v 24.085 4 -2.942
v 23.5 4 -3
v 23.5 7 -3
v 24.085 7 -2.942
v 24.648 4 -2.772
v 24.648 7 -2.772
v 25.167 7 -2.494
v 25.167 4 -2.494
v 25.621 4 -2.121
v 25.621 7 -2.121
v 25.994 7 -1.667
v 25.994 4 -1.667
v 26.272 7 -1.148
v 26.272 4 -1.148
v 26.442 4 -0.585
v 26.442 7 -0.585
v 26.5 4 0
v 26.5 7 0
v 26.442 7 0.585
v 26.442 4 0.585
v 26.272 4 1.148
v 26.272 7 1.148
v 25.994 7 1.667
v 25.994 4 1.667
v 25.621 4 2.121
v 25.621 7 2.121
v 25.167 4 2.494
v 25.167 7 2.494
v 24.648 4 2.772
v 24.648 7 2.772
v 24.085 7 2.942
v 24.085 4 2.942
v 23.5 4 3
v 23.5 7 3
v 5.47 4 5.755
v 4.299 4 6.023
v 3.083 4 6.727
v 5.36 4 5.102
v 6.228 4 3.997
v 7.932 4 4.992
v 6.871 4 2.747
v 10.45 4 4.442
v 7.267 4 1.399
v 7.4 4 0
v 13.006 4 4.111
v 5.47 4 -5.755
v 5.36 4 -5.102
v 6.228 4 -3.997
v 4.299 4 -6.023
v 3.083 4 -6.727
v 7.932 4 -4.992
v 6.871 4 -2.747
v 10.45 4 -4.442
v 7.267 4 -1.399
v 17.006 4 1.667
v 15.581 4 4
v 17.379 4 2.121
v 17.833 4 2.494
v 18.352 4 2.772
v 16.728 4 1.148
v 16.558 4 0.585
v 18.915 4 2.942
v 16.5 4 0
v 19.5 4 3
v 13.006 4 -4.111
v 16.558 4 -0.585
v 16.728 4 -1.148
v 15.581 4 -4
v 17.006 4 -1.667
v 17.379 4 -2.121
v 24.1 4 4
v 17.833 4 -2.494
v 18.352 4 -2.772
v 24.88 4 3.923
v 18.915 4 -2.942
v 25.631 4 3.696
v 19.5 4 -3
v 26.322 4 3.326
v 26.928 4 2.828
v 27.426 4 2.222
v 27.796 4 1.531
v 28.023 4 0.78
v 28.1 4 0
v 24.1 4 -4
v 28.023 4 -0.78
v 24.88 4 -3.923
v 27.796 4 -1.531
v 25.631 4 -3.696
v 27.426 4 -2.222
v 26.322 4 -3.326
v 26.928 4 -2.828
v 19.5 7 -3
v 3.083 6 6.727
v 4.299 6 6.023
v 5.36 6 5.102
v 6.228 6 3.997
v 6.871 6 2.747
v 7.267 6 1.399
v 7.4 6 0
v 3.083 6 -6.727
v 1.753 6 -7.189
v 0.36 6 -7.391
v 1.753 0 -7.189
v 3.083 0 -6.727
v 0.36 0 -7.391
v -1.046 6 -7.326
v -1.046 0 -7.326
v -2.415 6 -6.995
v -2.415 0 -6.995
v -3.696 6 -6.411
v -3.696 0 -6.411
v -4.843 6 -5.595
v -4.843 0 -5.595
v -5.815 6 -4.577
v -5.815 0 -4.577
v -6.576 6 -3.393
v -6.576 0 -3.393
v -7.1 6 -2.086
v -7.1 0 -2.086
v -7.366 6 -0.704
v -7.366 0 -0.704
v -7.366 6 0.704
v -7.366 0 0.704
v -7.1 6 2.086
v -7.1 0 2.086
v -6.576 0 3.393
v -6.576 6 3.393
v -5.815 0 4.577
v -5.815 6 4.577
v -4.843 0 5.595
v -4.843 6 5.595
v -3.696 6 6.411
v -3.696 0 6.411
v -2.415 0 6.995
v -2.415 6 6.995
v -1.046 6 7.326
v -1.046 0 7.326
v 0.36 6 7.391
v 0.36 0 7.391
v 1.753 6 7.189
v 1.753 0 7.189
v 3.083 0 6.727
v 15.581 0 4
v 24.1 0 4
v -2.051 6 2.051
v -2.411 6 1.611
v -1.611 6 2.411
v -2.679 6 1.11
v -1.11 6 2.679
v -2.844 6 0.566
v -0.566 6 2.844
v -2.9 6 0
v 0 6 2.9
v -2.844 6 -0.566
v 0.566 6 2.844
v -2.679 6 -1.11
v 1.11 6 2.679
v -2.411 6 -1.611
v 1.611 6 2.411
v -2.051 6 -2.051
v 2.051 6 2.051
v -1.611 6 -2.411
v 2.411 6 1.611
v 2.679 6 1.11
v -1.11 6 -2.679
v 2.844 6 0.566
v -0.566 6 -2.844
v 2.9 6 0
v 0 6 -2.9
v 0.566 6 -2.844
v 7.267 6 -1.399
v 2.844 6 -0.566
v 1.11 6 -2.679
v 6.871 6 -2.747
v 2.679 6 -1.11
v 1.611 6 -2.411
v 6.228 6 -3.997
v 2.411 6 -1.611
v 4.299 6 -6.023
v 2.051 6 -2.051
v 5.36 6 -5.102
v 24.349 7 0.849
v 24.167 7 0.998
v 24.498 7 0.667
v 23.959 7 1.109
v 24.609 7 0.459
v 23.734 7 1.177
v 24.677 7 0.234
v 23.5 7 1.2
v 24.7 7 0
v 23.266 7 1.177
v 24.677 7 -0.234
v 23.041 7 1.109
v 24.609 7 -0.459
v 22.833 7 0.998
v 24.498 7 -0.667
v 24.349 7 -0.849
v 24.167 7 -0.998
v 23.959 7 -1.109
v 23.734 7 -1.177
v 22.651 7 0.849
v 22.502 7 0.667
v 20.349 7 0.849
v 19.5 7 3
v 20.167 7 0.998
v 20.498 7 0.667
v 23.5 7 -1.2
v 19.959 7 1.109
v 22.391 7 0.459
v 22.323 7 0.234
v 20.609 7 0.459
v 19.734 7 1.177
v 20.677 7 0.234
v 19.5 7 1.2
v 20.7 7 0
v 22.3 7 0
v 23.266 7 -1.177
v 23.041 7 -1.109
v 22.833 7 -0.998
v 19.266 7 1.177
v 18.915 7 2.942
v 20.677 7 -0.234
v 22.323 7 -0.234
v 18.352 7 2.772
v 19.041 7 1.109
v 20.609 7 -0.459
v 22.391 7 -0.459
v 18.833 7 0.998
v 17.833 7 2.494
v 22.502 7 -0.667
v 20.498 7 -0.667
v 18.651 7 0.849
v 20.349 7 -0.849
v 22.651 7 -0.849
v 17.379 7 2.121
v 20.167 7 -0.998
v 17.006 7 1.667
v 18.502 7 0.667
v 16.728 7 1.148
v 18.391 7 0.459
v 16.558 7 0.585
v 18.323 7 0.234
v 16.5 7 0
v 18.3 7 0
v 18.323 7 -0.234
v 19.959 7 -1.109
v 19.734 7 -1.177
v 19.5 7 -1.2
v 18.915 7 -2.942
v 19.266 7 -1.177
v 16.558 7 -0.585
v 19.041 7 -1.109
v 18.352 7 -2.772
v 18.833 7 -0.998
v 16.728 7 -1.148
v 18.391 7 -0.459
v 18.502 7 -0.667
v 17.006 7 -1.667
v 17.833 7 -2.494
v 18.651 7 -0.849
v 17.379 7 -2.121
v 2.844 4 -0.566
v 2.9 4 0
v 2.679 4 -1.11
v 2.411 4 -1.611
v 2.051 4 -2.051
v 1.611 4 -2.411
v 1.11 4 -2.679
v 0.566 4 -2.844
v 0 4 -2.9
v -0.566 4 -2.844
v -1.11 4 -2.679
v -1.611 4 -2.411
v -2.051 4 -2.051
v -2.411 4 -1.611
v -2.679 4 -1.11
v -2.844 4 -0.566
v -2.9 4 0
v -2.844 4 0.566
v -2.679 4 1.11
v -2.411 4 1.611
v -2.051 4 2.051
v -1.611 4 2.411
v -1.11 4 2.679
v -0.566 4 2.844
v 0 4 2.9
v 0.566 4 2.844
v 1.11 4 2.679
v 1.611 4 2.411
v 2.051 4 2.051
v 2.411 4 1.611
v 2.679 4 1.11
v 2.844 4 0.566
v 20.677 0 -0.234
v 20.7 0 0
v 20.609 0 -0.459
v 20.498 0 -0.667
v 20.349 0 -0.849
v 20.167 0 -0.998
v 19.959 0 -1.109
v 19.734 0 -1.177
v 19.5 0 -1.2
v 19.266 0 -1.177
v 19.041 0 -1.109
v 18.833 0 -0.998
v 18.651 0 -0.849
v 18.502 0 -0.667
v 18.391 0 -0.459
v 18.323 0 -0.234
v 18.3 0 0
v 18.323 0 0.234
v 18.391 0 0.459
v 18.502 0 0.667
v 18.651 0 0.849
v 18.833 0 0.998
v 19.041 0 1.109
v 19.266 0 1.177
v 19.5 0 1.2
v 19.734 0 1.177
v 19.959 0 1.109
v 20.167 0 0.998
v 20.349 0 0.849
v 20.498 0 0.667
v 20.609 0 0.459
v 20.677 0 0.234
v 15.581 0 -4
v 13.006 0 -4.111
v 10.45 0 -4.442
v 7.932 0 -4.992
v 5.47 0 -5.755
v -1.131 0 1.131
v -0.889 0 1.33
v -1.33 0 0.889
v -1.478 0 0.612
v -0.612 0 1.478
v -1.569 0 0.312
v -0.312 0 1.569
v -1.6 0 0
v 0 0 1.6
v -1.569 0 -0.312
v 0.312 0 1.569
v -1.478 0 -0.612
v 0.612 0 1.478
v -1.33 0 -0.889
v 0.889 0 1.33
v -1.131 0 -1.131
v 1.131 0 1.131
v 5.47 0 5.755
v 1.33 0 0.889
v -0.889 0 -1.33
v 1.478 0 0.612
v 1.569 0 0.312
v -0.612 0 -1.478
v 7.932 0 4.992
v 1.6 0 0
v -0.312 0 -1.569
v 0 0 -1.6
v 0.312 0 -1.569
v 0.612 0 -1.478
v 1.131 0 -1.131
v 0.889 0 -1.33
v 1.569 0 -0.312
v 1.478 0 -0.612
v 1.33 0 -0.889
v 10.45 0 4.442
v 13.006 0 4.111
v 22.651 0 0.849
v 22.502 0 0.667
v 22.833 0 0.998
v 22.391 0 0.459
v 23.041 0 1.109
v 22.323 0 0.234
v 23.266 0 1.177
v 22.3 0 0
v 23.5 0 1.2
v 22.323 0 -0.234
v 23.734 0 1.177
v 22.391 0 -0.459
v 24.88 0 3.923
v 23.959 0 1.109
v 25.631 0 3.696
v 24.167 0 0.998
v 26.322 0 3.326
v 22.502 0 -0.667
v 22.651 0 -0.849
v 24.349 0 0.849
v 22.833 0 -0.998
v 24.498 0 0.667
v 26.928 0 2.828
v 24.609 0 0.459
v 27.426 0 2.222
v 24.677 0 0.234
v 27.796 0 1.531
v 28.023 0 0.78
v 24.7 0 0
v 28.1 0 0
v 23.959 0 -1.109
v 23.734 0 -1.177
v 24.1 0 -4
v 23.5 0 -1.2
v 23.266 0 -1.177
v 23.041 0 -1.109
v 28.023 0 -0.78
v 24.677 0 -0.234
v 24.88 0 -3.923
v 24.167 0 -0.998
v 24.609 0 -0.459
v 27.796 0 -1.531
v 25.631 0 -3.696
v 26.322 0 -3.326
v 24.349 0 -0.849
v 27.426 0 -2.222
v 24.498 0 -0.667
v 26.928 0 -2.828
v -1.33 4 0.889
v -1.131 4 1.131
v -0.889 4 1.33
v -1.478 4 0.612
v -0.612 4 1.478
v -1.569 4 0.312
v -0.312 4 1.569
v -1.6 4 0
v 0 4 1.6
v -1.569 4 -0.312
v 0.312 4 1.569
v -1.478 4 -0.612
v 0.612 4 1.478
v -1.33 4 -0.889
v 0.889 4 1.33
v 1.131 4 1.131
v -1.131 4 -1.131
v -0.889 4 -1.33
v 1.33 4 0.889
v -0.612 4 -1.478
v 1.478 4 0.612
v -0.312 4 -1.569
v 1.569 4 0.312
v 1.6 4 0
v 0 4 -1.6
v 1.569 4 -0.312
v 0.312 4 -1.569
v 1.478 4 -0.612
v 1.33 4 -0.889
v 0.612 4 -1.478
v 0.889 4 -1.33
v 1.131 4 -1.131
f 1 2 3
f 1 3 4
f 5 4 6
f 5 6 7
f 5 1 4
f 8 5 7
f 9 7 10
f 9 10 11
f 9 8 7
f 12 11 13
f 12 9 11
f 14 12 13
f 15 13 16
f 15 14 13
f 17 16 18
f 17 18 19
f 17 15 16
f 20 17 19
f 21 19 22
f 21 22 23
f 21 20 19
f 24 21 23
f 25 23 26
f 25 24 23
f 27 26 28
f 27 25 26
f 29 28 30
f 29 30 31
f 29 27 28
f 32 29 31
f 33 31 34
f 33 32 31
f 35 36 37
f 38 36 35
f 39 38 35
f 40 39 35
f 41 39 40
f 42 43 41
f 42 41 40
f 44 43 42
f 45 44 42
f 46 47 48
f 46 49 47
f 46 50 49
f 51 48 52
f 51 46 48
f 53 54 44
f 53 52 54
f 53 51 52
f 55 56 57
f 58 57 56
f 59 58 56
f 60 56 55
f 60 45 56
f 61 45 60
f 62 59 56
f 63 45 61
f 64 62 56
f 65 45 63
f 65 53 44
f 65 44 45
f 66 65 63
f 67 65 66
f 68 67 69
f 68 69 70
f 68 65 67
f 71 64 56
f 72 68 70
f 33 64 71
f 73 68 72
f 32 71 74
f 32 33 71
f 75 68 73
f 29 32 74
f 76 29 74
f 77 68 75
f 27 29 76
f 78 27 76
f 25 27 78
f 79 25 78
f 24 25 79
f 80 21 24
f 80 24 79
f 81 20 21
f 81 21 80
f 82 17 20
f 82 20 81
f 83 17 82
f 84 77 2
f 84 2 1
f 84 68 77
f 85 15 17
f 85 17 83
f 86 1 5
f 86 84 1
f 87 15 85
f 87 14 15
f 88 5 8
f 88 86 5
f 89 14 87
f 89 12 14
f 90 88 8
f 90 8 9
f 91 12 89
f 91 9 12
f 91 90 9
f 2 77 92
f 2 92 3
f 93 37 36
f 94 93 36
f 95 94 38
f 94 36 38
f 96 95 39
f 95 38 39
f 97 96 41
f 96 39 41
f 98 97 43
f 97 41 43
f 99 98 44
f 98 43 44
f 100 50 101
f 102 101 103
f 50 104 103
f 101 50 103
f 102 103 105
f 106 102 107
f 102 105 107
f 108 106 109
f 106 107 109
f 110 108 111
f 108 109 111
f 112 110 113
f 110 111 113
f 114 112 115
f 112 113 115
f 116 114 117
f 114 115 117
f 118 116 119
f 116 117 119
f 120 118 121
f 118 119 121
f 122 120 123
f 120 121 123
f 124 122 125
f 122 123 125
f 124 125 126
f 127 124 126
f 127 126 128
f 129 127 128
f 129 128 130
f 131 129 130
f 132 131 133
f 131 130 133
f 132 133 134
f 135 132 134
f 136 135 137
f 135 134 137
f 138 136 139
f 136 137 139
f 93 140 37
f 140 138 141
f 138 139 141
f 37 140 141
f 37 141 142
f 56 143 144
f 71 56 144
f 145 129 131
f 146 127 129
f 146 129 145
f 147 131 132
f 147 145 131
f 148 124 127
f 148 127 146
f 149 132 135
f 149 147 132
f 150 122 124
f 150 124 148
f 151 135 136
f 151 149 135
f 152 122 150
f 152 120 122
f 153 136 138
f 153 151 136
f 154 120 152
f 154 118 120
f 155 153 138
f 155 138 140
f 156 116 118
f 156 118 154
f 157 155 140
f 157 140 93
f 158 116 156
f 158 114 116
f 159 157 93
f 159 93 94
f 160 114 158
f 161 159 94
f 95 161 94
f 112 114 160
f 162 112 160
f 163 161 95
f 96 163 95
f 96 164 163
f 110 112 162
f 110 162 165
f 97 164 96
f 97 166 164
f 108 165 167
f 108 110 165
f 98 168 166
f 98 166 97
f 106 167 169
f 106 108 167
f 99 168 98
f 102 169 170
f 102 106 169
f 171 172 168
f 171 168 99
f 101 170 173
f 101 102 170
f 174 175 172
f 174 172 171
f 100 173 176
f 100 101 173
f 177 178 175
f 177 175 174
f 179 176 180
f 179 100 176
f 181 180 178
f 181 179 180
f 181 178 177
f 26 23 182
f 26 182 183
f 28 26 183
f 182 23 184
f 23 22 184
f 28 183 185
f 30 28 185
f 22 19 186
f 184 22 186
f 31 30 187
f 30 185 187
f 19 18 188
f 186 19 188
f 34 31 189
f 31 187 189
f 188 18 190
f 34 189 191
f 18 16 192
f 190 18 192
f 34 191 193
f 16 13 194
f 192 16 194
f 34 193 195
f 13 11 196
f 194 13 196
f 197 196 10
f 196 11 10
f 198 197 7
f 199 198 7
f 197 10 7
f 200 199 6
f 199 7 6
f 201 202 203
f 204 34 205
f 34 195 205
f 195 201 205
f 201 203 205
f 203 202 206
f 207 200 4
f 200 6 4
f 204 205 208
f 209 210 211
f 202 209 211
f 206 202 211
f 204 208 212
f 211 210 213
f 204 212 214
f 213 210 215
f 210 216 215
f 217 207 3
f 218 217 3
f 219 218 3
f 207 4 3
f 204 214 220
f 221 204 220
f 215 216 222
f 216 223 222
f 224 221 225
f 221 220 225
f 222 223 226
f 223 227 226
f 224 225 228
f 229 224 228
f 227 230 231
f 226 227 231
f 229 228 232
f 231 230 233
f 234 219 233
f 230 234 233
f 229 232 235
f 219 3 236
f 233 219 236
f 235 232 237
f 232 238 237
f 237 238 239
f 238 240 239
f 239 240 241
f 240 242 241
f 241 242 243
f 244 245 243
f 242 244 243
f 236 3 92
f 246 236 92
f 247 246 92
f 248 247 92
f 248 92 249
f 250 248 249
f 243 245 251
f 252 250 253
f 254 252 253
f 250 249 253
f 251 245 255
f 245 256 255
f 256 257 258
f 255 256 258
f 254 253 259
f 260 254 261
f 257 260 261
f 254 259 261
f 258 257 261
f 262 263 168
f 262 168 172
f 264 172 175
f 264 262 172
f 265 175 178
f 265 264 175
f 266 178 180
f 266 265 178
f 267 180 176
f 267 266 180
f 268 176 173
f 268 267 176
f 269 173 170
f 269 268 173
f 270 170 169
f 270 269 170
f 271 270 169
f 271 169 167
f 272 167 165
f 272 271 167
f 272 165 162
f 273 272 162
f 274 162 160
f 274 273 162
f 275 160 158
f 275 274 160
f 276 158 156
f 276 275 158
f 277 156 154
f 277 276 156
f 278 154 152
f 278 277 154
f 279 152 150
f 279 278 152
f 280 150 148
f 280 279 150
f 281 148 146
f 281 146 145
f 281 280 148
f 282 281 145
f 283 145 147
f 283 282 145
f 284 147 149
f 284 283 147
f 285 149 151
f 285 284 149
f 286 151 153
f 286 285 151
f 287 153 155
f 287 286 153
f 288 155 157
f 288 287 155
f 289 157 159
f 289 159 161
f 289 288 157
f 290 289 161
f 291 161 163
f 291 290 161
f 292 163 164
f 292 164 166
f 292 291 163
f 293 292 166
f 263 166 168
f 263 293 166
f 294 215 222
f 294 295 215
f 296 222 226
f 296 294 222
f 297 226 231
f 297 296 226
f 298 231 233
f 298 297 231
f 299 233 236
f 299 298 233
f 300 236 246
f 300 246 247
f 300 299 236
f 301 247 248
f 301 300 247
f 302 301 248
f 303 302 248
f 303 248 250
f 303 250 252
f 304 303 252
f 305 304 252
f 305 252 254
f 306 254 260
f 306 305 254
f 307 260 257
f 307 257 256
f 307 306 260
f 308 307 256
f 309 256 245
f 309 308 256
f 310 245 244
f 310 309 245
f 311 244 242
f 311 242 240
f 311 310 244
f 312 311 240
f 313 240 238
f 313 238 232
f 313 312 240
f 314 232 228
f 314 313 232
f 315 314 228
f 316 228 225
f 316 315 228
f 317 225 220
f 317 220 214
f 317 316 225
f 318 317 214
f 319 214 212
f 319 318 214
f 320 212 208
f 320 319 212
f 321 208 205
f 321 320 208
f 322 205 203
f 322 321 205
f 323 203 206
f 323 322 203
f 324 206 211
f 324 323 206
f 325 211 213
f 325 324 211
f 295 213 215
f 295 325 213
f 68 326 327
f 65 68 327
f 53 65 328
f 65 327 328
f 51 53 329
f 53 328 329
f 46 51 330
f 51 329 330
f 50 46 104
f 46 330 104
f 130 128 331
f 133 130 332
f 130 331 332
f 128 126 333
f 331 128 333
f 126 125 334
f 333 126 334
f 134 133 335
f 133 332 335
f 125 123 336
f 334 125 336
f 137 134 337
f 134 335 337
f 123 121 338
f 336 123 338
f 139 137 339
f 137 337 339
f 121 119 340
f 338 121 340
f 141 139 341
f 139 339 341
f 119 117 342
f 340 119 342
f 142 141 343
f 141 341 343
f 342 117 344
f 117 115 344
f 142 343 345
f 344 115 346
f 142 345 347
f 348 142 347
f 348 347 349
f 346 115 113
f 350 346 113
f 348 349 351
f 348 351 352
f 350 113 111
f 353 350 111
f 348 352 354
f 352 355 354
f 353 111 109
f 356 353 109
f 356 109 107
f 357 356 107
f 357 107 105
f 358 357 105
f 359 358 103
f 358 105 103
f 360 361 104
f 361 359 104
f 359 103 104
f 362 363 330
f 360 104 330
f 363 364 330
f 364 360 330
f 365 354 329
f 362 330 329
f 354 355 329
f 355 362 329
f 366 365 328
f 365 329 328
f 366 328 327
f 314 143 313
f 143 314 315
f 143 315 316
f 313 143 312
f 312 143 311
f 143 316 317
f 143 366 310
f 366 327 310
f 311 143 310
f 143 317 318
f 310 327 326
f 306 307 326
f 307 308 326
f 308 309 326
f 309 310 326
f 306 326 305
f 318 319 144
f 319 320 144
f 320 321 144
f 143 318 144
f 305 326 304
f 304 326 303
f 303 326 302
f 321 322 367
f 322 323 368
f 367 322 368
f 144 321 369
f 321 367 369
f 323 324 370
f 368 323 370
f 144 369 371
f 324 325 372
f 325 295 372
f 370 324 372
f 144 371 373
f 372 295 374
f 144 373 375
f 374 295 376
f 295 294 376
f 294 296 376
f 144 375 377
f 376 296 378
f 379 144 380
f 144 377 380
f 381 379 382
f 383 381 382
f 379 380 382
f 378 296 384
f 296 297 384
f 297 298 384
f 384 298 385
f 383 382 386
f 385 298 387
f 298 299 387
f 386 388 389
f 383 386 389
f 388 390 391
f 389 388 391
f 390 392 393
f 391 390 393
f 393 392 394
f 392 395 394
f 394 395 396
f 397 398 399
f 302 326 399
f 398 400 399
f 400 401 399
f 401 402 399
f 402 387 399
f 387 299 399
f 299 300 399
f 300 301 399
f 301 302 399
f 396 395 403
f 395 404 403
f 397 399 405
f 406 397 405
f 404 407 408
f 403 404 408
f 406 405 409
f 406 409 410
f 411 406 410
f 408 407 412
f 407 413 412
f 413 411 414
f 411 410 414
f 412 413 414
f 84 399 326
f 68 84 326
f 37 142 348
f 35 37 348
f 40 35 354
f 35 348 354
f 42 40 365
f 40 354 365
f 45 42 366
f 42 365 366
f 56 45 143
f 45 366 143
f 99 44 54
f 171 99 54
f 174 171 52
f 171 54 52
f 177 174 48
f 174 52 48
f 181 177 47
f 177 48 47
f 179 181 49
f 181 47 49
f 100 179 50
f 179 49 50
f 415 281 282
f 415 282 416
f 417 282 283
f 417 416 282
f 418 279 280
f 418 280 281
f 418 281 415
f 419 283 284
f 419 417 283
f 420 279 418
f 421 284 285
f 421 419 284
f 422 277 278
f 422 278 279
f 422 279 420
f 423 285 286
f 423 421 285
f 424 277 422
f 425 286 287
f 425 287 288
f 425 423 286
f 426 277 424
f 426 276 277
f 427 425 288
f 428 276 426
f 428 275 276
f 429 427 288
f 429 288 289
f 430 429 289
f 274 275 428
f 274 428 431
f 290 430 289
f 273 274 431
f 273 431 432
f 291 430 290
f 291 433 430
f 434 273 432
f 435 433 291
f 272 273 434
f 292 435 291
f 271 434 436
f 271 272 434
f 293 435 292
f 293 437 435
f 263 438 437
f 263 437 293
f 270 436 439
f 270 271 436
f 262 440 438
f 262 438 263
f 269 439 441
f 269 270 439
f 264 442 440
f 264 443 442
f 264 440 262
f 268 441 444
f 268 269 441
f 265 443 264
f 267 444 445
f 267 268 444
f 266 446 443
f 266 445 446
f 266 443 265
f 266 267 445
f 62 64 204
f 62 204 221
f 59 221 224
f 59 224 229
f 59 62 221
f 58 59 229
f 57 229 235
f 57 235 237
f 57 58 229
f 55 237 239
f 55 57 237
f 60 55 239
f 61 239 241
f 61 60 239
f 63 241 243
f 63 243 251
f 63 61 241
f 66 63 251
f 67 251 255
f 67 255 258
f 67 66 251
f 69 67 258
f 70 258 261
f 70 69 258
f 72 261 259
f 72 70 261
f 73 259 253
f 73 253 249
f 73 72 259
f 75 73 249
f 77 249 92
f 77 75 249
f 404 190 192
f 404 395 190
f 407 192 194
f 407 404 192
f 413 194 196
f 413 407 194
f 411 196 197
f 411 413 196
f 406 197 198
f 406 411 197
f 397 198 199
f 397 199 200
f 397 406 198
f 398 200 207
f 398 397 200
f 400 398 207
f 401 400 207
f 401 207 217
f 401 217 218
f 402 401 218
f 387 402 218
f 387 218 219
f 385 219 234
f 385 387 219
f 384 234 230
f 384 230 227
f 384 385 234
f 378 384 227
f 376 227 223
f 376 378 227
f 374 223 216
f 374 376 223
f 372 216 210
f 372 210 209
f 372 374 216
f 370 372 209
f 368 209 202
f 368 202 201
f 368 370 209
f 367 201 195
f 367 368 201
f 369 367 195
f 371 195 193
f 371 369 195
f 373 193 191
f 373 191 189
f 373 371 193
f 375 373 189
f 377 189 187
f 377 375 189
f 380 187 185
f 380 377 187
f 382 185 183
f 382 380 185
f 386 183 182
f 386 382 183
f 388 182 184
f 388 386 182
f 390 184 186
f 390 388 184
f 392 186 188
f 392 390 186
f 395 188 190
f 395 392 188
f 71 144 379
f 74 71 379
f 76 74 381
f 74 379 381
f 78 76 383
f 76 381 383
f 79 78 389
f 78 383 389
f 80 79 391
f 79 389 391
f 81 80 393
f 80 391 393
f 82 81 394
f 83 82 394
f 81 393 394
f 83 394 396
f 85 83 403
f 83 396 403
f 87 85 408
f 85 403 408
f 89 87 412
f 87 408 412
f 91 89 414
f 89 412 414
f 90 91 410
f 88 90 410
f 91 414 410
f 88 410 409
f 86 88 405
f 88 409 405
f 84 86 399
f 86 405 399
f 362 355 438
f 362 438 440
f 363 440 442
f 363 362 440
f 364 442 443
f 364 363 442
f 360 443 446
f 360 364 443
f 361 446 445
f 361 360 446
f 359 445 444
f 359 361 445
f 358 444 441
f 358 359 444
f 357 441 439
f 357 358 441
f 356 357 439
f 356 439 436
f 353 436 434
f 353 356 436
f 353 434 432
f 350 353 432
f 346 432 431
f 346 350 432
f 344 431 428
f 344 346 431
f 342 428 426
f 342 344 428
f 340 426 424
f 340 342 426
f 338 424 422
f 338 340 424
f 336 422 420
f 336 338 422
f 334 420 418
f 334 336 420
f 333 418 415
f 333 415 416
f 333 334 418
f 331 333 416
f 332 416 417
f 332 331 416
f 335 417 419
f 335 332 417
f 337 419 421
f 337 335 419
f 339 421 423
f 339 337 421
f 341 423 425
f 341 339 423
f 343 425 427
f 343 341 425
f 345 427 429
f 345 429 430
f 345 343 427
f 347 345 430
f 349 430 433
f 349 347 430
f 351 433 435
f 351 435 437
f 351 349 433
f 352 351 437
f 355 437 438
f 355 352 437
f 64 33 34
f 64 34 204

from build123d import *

# Parameters (mm, degrees)
SKETCH1_R           = 1.2
SKETCH1_R_2         = 1.6
BOSS_EXTRUDE1_DEPTH = 4
SKETCH2_R           = 1.2
BOSS_EXTRUDE2_DEPTH = 3
SKETCH3_R           = 2.9
BOSS_EXTRUDE3_DEPTH = 2


with BuildPart() as part:
    # Sketch1 → Boss-Extrude1 (new body)
    with BuildSketch(Plane(origin=(0, 0, 0), x_dir=(1, 0, 0), z_dir=(0, 1, 0))):
        with BuildLine():
            Line((24.1, 4), (15.580757363, 4))
            ThreePointArc((15.580757363, 4), (9.184735872, 4.689747372), (3.082823649, 6.727272727))
            ThreePointArc((3.082823649, 6.727272727), (-7.4, 0), (3.082823649, -6.727272727))
            ThreePointArc((3.082823649, -6.727272727), (9.184735872, -4.689747372), (15.580757363, -4))
            Line((15.580757363, -4), (24.1, -4))
            ThreePointArc((24.1, -4), (28.1, 0), (24.1, 4))
        make_face()
        with Locations((19.5, 0)):
            Circle(SKETCH1_R, mode=Mode.SUBTRACT)
        with Locations((23.5, 0)):
            Circle(SKETCH1_R, mode=Mode.SUBTRACT)
        Circle(SKETCH1_R_2, mode=Mode.SUBTRACT)
    extrude(amount=BOSS_EXTRUDE1_DEPTH)

    # Sketch2 → Boss-Extrude2 (add)
    with BuildSketch(Plane(origin=(0, 4, 0), x_dir=(1, 0, 0), z_dir=(0, 1, 0))):
        with BuildLine():
            Line((19.5, 3), (23.5, 3))
            ThreePointArc((23.5, 3), (26.5, 0), (23.5, -3))
            Line((23.5, -3), (19.5, -3))
            ThreePointArc((19.5, -3), (16.5, 0), (19.5, 3))
        make_face()
        with Locations((19.5, 0)):
            Circle(SKETCH2_R, mode=Mode.SUBTRACT)
        with Locations((23.5, 0)):
            Circle(SKETCH2_R, mode=Mode.SUBTRACT)
    extrude(amount=BOSS_EXTRUDE2_DEPTH)

    # Sketch3 → Boss-Extrude3 (add)
    with BuildSketch(Plane(origin=(0, 4, 0), x_dir=(1, 0, 0), z_dir=(0, 1, 0))):
        with BuildLine():
            ThreePointArc((7.4, 0), (6.227876645, 3.996692695), (3.082823649, 6.727272727))
            ThreePointArc((3.082823649, 6.727272727), (-7.4, 0), (3.082823649, -6.727272727))
            ThreePointArc((3.082823649, -6.727272727), (6.227876645, -3.996692695), (7.4, 0))
        make_face()
        Circle(SKETCH3_R, mode=Mode.SUBTRACT)
    extrude(amount=BOSS_EXTRUDE3_DEPTH)


solid = part.part
